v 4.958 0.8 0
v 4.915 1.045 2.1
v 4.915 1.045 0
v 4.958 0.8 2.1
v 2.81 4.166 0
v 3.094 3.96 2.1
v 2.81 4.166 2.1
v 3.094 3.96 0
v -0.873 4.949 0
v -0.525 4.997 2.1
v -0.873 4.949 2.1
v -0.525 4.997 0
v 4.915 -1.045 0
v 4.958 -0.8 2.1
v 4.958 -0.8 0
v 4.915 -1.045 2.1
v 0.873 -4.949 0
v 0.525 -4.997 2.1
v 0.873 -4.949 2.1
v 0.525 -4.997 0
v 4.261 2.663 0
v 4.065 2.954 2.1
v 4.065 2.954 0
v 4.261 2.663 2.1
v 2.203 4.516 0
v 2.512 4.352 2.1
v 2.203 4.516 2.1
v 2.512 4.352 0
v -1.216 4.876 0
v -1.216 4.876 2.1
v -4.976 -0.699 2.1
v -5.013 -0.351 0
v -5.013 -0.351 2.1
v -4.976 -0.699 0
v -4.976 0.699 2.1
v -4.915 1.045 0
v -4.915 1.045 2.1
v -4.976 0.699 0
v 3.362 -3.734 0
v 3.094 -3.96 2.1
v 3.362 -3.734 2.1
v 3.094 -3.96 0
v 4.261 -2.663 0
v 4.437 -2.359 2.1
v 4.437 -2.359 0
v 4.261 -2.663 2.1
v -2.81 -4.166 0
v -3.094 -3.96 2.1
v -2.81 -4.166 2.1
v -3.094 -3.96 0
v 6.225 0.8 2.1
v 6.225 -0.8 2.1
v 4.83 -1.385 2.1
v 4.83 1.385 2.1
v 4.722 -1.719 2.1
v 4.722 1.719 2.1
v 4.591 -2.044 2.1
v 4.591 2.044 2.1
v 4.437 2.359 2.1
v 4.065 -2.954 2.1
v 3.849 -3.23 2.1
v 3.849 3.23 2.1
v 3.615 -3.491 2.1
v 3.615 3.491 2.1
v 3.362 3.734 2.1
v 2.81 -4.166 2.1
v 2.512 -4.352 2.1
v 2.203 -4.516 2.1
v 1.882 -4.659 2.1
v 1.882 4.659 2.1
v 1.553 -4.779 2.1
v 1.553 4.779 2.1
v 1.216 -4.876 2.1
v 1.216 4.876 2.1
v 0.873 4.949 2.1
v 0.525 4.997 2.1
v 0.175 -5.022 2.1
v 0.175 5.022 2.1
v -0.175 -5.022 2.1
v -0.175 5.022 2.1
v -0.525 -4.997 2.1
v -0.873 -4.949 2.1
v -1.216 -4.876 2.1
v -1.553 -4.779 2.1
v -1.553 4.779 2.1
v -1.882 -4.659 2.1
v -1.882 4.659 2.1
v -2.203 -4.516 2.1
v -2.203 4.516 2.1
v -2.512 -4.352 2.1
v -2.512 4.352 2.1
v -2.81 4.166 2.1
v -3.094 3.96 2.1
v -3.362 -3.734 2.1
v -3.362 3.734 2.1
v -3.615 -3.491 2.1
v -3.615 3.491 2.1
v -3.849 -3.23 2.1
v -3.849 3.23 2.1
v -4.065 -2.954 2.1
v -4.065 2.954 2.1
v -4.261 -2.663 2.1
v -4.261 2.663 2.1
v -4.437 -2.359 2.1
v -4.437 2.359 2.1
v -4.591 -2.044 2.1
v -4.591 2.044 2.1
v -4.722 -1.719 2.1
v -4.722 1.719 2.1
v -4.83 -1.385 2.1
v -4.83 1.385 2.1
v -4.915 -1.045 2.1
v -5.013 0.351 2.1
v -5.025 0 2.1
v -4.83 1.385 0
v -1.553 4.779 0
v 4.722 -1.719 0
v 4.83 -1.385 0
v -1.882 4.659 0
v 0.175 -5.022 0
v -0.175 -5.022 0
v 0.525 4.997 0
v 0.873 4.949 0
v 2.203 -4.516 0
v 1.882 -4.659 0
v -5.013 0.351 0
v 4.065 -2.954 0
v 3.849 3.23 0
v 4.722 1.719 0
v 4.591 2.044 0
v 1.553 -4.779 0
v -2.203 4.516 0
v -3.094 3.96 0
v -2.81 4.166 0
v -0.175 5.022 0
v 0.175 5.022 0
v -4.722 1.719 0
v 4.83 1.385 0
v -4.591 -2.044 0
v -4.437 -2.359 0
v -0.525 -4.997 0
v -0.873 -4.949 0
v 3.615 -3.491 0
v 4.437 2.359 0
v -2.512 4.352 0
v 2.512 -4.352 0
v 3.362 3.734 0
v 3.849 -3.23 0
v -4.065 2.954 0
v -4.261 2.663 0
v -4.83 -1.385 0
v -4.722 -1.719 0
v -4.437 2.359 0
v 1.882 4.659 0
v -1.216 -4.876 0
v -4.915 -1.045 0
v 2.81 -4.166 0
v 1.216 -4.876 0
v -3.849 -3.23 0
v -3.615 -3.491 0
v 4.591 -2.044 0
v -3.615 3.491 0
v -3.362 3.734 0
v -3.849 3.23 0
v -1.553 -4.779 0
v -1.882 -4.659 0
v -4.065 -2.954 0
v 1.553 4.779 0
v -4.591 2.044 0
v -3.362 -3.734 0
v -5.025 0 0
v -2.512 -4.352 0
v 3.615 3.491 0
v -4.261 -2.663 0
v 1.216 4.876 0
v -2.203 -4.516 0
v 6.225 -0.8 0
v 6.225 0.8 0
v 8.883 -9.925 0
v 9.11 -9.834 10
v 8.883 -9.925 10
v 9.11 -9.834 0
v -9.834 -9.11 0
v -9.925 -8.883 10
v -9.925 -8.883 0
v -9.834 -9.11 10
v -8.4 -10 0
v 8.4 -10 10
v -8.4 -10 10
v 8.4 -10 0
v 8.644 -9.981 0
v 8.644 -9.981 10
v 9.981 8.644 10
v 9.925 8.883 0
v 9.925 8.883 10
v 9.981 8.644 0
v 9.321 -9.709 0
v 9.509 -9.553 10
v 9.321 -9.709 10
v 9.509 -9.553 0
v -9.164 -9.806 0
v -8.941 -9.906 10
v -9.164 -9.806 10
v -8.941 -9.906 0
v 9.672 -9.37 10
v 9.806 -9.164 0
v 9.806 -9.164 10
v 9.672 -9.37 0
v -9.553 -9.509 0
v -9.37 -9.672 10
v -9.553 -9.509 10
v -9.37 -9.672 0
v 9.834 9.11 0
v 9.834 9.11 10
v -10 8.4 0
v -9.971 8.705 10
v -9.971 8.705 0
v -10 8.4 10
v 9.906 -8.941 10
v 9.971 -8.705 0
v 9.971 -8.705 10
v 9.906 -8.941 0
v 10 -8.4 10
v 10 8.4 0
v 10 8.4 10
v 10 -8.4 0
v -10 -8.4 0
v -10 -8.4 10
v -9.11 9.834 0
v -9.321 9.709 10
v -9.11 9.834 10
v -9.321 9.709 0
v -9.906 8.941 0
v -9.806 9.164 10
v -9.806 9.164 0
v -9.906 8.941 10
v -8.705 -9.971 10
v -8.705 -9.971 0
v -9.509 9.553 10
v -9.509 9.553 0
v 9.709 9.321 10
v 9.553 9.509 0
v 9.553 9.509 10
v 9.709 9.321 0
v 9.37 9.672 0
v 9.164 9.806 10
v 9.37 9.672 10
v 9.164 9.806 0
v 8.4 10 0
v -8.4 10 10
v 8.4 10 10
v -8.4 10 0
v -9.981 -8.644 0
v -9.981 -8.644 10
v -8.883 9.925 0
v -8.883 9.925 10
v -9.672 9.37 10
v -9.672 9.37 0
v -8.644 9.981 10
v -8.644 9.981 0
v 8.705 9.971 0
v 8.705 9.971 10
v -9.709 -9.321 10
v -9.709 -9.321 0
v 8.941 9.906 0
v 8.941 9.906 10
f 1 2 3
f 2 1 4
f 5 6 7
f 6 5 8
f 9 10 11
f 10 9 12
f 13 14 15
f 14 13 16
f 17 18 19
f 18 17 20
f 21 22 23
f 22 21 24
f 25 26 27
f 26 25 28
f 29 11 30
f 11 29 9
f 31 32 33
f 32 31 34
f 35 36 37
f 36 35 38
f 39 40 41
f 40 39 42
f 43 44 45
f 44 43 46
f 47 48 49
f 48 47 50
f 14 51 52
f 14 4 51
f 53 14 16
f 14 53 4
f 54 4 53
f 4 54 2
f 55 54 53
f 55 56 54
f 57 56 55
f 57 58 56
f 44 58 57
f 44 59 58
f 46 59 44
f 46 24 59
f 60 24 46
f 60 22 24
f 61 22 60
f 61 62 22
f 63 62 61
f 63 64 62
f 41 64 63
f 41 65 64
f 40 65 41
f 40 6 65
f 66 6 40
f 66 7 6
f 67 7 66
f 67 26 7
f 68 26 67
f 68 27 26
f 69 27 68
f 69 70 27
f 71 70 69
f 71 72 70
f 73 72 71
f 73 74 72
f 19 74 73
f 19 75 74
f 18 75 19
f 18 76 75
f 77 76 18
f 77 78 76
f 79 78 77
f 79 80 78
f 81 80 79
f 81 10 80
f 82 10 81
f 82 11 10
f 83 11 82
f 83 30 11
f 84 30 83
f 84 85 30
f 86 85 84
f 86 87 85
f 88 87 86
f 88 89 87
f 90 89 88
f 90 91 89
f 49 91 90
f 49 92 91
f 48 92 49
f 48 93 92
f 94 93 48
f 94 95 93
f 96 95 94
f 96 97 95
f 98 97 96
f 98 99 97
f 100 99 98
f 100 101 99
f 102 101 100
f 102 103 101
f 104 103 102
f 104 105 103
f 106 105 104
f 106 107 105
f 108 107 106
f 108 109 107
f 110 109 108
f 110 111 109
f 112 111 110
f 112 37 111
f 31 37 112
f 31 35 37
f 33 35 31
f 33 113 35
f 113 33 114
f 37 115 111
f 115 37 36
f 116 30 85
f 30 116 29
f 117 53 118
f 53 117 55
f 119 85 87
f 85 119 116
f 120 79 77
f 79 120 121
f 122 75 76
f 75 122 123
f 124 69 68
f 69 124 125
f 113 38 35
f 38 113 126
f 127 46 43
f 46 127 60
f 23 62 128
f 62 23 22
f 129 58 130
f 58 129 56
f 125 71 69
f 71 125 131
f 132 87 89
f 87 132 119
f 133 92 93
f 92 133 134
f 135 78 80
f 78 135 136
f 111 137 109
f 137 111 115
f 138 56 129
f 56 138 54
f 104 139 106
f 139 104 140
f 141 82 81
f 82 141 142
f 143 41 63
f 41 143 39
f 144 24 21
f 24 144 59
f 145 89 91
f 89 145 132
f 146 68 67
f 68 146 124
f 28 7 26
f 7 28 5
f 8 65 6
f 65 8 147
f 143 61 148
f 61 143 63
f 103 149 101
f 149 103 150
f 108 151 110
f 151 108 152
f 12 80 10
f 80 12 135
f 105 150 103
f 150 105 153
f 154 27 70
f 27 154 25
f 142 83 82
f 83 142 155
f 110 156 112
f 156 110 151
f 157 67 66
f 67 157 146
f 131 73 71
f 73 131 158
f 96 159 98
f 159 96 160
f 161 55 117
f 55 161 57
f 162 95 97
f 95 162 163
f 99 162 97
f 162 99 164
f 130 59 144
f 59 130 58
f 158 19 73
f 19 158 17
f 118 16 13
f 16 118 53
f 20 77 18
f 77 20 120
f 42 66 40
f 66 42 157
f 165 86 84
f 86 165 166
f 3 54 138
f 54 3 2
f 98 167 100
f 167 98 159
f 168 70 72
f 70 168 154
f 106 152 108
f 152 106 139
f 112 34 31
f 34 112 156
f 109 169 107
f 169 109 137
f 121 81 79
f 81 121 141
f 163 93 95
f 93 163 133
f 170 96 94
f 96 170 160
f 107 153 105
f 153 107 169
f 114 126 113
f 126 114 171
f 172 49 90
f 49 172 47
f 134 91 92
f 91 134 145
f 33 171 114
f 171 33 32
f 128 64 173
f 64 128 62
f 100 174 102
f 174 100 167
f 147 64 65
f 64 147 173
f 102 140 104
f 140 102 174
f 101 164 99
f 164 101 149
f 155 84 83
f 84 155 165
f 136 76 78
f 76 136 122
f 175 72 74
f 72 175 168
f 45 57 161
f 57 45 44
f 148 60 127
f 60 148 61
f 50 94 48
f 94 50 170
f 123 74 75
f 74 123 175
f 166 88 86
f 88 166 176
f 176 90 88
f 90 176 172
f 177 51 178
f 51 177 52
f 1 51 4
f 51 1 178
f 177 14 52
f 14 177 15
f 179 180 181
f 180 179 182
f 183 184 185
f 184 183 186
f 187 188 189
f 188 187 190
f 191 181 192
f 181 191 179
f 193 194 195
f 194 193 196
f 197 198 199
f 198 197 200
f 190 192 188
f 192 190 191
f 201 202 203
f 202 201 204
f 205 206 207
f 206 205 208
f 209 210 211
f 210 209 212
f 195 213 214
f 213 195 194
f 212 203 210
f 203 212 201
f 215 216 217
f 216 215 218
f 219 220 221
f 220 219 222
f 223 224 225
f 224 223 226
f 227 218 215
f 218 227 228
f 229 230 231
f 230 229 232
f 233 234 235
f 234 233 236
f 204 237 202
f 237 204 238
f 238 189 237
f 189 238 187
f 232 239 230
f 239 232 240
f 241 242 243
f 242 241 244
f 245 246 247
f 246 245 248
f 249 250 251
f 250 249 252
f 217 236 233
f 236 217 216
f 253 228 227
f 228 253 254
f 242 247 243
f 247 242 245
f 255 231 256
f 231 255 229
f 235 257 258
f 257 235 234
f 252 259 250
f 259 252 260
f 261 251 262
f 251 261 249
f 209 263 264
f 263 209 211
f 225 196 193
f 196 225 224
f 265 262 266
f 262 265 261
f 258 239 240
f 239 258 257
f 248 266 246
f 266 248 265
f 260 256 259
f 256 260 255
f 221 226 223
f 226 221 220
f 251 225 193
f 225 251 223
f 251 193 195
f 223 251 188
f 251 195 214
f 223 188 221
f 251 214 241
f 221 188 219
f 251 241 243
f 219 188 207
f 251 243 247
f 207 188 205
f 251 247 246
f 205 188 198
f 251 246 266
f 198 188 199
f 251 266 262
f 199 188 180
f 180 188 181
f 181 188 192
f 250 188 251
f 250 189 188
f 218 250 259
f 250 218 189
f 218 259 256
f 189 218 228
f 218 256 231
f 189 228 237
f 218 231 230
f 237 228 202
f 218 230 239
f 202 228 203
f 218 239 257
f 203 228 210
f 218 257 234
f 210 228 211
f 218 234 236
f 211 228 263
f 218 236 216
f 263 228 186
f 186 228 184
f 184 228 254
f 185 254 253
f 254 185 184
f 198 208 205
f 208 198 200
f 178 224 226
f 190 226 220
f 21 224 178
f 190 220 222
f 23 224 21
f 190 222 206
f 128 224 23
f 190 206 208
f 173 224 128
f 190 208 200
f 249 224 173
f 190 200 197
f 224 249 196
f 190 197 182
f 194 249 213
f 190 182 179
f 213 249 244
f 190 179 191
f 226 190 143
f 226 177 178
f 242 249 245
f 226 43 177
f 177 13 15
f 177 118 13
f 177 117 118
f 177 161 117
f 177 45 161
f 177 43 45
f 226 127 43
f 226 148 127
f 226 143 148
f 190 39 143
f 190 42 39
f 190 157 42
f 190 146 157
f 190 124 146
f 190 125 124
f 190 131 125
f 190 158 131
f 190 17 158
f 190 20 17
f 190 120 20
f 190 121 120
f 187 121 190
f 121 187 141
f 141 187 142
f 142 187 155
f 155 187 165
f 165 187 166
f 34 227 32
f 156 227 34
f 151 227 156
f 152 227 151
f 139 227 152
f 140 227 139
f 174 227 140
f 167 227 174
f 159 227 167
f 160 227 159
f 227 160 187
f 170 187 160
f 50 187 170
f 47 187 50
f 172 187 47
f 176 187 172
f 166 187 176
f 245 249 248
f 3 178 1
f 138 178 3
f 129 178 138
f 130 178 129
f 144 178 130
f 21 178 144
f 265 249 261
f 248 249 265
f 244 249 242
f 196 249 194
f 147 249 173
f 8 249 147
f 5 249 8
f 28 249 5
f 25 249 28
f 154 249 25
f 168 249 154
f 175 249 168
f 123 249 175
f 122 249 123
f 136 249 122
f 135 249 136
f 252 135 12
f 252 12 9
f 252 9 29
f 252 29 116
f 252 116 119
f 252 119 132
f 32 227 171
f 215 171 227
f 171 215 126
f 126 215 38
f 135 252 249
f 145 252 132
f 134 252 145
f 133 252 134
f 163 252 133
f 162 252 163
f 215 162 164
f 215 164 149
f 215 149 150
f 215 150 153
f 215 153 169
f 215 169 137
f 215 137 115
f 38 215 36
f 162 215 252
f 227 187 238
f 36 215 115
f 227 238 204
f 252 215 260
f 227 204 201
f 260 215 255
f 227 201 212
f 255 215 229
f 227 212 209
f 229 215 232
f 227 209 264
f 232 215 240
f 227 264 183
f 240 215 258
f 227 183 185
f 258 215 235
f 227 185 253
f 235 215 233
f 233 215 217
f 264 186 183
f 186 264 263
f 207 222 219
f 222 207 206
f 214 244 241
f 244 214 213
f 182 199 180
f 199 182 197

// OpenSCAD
// 20 mm green chore-tile body for one removable 10 x 2 mm disc magnet.
// The 0.05 mm diametral and 0.1 mm depth clearances reuse the 6 mm fit
// as a starting point; the 10 mm magnet fit has not yet been tested.
tile_size = 20;
tile_thickness = 10;
corner_radius = 1.6; // use 2 for bathroom and attic-hoover tiles
magnet_diameter = 10;
magnet_thickness = 2;
pocket_diameter_clearance = 0.05;
pocket_depth_clearance = 0.1;
notch_width = 1.6;
notch_extension = 1.2;
eps = 0.02;
pocket_d = magnet_diameter + pocket_diameter_clearance;
pocket_depth = magnet_thickness + pocket_depth_clearance;
$fa = 4; $fs = 0.25;
assert(tile_size > 2*corner_radius && corner_radius > 0, "Check tile size and corner radius.");
assert(pocket_d/2 + notch_extension < tile_size/2-corner_radius, "Magnet pocket or removal notch is too close to the edge.");
assert(pocket_depth > 0 && pocket_depth < tile_thickness - 0.8, "Check magnet and tile thickness.");
difference() {
 linear_extrude(height=tile_thickness) offset(r=corner_radius) square([tile_size-2*corner_radius,tile_size-2*corner_radius],center=true);
 translate([0,0,-eps]) union() {
  cylinder(d=pocket_d,h=pocket_depth+eps);
  translate([pocket_d/2-0.5+notch_extension/2,0,(pocket_depth+eps)/2]) cube([notch_extension+1,notch_width,pocket_depth+eps],center=true);
 }
}
